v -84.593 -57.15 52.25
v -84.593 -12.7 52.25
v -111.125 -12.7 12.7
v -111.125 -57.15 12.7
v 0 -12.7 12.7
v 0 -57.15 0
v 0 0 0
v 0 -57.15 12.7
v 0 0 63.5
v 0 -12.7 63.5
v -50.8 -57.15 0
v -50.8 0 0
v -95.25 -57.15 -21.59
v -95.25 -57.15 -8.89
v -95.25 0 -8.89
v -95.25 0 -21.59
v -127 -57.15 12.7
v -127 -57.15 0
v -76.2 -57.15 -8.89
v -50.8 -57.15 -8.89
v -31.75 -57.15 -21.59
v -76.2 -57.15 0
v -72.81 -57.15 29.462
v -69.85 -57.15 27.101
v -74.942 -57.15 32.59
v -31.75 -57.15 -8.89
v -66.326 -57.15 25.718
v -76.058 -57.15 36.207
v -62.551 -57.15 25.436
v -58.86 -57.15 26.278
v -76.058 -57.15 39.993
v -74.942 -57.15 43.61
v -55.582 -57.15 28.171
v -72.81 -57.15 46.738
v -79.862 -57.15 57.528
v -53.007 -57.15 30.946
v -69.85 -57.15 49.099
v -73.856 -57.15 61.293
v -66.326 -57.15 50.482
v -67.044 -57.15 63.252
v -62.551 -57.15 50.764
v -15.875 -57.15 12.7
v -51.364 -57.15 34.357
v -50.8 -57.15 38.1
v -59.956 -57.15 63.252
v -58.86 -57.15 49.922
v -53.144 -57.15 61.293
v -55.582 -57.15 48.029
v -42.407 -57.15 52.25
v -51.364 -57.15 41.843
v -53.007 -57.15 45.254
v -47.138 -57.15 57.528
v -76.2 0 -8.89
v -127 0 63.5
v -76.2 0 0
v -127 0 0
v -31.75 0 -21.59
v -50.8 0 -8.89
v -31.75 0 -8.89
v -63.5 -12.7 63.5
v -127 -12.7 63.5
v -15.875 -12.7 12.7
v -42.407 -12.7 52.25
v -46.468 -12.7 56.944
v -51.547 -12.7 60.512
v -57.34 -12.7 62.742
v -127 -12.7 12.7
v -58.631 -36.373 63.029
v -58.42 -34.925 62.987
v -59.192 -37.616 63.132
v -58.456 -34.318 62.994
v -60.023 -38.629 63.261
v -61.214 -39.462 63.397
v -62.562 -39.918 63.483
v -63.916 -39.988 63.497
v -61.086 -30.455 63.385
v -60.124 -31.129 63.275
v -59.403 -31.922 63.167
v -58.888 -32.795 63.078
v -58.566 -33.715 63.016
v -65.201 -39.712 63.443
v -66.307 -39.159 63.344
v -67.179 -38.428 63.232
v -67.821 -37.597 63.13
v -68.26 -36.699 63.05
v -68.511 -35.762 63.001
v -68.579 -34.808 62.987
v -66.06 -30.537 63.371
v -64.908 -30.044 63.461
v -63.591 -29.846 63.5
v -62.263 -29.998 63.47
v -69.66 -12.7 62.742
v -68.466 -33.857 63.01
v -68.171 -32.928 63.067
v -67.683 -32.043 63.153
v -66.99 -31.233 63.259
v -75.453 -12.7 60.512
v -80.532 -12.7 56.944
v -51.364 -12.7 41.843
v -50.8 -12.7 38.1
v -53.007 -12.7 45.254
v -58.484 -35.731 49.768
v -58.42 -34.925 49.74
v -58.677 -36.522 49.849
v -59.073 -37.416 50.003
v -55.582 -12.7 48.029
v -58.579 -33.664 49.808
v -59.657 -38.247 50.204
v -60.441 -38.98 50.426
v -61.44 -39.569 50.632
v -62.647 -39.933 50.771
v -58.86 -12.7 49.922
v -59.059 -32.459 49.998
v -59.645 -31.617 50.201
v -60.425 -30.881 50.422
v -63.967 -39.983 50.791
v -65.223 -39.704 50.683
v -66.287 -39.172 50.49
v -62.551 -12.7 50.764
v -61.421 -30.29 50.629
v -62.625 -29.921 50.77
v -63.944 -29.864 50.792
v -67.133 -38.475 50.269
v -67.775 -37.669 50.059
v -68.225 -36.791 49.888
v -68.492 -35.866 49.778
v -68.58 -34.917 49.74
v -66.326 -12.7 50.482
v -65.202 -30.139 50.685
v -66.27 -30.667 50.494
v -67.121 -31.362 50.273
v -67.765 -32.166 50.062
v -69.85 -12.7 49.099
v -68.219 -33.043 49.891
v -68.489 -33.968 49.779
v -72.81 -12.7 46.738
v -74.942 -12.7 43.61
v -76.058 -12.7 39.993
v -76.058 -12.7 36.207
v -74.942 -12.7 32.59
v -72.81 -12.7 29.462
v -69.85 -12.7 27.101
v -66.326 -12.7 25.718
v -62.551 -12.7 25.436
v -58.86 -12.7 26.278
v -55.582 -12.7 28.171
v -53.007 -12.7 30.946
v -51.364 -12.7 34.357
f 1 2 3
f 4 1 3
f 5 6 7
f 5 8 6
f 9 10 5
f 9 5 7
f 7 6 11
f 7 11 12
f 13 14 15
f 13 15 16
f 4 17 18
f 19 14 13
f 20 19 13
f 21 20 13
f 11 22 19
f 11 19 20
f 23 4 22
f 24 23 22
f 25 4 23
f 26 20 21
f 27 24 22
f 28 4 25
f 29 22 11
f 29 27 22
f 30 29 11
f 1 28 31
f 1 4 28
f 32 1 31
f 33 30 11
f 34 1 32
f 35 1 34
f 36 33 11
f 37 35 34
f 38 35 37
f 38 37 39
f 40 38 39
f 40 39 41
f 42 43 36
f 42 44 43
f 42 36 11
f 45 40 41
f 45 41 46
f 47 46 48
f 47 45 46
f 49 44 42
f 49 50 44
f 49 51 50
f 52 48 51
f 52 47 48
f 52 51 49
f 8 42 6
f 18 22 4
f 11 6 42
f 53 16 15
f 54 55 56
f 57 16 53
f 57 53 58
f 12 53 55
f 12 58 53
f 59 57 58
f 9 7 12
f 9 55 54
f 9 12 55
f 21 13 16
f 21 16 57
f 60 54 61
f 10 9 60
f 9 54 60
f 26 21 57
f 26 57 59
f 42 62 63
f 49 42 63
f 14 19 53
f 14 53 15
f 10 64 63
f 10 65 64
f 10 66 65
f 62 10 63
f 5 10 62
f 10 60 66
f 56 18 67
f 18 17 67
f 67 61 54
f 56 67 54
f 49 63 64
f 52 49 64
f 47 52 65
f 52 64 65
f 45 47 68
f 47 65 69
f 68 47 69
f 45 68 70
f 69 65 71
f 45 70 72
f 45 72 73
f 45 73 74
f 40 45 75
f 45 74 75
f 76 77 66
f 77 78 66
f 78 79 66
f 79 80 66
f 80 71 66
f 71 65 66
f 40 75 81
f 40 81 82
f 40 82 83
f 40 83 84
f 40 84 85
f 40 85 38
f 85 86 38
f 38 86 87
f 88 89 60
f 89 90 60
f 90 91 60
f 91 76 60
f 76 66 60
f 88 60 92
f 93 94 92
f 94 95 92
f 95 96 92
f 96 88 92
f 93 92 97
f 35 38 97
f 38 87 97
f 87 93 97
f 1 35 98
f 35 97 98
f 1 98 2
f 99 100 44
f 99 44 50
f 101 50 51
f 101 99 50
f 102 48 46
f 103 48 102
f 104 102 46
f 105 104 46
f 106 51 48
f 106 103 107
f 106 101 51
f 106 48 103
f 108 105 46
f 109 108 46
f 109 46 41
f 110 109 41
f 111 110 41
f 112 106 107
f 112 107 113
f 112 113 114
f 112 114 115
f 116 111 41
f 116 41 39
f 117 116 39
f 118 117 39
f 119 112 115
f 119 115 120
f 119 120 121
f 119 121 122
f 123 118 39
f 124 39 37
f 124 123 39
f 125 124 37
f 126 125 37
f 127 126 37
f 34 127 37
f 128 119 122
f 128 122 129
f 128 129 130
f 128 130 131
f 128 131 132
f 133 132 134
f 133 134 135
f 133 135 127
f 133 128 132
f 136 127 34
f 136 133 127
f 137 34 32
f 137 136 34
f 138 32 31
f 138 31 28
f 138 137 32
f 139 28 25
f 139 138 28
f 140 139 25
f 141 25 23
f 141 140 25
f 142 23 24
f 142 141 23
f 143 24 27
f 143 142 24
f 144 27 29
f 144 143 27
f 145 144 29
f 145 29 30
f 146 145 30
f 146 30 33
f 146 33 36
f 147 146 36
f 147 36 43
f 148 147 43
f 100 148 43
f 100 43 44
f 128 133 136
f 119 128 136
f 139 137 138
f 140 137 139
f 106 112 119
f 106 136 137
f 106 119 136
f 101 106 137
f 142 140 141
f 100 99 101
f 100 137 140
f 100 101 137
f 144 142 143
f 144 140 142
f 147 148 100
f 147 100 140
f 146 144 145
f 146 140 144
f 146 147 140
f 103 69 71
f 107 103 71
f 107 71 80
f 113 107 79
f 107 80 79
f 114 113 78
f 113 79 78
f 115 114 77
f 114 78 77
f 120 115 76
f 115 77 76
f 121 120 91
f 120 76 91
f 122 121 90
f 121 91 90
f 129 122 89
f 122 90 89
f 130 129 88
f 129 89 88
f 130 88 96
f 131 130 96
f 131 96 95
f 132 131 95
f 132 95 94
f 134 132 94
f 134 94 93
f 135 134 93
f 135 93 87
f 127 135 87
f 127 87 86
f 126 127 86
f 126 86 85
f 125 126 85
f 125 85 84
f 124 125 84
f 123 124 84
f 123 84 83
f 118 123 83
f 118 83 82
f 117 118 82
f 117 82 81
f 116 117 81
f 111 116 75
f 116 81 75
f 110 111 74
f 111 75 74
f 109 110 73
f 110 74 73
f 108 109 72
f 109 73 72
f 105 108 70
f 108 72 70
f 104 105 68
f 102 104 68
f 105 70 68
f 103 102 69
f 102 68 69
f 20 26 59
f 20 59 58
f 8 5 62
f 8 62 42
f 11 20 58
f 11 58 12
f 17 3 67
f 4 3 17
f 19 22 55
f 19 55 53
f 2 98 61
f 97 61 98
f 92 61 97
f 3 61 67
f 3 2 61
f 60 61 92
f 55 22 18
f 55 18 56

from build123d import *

# Parameters (mm, degrees)
F1_DEPTH = 127
F3_DEPTH = 57.15
F4_R     = 12.7
F5_DEPTH = 44.45
F6_R     = 5.08
F7_DEPTH = 13.7612578348


with BuildPart() as f1:
    # F0 (on Right) → F1 (new body)
    with BuildSketch(Plane.YZ):
        Polygon((-57.15, 0), (0, 0), (0, 63.5), (-12.7, 63.5), (-12.7, 12.7), (-57.15, 12.7), align=None)
    extrude(amount=-F1_DEPTH)

    # F2 (on face) → F3 (join)
    with BuildSketch(Plane.XZ.offset(57.15)):
        Polygon((-50.8, 0), (-63.5, 0), (-76.2, 0), (-76.2, -8.89), (-95.25, -8.89), (-95.25, -21.59), (-31.75, -21.59), (-31.75, -8.89), (-50.8, -8.89), align=None)
    extrude(amount=-F3_DEPTH)

    # F4 (on face) → F5 (join, through all)
    with BuildSketch(Plane.XZ.offset(12.7)):
        with BuildLine():
            Line((-111.125, 12.7), (-15.875, 12.7))
            Line((-15.875, 12.7), (-42.4065743945, 52.2501730104))
            ThreePointArc((-42.4065743945, 52.2501730104), (-63.5, 63.5), (-84.5934256055, 52.2501730104))
            Line((-84.5934256055, 52.2501730104), (-111.125, 12.7))
        make_face()
        with Locations((-63.5, 38.1)):
            Circle(F4_R, mode=Mode.SUBTRACT)
    extrude(amount=F5_DEPTH)

    # F6 (on face) → F7 (cut, through all)
    with BuildSketch(Plane.XY.offset(63.5)):
        with Locations((-63.5, -34.925)):
            Circle(F6_R)
    extrude(amount=-F7_DEPTH, mode=Mode.SUBTRACT)


solid = f1.part
